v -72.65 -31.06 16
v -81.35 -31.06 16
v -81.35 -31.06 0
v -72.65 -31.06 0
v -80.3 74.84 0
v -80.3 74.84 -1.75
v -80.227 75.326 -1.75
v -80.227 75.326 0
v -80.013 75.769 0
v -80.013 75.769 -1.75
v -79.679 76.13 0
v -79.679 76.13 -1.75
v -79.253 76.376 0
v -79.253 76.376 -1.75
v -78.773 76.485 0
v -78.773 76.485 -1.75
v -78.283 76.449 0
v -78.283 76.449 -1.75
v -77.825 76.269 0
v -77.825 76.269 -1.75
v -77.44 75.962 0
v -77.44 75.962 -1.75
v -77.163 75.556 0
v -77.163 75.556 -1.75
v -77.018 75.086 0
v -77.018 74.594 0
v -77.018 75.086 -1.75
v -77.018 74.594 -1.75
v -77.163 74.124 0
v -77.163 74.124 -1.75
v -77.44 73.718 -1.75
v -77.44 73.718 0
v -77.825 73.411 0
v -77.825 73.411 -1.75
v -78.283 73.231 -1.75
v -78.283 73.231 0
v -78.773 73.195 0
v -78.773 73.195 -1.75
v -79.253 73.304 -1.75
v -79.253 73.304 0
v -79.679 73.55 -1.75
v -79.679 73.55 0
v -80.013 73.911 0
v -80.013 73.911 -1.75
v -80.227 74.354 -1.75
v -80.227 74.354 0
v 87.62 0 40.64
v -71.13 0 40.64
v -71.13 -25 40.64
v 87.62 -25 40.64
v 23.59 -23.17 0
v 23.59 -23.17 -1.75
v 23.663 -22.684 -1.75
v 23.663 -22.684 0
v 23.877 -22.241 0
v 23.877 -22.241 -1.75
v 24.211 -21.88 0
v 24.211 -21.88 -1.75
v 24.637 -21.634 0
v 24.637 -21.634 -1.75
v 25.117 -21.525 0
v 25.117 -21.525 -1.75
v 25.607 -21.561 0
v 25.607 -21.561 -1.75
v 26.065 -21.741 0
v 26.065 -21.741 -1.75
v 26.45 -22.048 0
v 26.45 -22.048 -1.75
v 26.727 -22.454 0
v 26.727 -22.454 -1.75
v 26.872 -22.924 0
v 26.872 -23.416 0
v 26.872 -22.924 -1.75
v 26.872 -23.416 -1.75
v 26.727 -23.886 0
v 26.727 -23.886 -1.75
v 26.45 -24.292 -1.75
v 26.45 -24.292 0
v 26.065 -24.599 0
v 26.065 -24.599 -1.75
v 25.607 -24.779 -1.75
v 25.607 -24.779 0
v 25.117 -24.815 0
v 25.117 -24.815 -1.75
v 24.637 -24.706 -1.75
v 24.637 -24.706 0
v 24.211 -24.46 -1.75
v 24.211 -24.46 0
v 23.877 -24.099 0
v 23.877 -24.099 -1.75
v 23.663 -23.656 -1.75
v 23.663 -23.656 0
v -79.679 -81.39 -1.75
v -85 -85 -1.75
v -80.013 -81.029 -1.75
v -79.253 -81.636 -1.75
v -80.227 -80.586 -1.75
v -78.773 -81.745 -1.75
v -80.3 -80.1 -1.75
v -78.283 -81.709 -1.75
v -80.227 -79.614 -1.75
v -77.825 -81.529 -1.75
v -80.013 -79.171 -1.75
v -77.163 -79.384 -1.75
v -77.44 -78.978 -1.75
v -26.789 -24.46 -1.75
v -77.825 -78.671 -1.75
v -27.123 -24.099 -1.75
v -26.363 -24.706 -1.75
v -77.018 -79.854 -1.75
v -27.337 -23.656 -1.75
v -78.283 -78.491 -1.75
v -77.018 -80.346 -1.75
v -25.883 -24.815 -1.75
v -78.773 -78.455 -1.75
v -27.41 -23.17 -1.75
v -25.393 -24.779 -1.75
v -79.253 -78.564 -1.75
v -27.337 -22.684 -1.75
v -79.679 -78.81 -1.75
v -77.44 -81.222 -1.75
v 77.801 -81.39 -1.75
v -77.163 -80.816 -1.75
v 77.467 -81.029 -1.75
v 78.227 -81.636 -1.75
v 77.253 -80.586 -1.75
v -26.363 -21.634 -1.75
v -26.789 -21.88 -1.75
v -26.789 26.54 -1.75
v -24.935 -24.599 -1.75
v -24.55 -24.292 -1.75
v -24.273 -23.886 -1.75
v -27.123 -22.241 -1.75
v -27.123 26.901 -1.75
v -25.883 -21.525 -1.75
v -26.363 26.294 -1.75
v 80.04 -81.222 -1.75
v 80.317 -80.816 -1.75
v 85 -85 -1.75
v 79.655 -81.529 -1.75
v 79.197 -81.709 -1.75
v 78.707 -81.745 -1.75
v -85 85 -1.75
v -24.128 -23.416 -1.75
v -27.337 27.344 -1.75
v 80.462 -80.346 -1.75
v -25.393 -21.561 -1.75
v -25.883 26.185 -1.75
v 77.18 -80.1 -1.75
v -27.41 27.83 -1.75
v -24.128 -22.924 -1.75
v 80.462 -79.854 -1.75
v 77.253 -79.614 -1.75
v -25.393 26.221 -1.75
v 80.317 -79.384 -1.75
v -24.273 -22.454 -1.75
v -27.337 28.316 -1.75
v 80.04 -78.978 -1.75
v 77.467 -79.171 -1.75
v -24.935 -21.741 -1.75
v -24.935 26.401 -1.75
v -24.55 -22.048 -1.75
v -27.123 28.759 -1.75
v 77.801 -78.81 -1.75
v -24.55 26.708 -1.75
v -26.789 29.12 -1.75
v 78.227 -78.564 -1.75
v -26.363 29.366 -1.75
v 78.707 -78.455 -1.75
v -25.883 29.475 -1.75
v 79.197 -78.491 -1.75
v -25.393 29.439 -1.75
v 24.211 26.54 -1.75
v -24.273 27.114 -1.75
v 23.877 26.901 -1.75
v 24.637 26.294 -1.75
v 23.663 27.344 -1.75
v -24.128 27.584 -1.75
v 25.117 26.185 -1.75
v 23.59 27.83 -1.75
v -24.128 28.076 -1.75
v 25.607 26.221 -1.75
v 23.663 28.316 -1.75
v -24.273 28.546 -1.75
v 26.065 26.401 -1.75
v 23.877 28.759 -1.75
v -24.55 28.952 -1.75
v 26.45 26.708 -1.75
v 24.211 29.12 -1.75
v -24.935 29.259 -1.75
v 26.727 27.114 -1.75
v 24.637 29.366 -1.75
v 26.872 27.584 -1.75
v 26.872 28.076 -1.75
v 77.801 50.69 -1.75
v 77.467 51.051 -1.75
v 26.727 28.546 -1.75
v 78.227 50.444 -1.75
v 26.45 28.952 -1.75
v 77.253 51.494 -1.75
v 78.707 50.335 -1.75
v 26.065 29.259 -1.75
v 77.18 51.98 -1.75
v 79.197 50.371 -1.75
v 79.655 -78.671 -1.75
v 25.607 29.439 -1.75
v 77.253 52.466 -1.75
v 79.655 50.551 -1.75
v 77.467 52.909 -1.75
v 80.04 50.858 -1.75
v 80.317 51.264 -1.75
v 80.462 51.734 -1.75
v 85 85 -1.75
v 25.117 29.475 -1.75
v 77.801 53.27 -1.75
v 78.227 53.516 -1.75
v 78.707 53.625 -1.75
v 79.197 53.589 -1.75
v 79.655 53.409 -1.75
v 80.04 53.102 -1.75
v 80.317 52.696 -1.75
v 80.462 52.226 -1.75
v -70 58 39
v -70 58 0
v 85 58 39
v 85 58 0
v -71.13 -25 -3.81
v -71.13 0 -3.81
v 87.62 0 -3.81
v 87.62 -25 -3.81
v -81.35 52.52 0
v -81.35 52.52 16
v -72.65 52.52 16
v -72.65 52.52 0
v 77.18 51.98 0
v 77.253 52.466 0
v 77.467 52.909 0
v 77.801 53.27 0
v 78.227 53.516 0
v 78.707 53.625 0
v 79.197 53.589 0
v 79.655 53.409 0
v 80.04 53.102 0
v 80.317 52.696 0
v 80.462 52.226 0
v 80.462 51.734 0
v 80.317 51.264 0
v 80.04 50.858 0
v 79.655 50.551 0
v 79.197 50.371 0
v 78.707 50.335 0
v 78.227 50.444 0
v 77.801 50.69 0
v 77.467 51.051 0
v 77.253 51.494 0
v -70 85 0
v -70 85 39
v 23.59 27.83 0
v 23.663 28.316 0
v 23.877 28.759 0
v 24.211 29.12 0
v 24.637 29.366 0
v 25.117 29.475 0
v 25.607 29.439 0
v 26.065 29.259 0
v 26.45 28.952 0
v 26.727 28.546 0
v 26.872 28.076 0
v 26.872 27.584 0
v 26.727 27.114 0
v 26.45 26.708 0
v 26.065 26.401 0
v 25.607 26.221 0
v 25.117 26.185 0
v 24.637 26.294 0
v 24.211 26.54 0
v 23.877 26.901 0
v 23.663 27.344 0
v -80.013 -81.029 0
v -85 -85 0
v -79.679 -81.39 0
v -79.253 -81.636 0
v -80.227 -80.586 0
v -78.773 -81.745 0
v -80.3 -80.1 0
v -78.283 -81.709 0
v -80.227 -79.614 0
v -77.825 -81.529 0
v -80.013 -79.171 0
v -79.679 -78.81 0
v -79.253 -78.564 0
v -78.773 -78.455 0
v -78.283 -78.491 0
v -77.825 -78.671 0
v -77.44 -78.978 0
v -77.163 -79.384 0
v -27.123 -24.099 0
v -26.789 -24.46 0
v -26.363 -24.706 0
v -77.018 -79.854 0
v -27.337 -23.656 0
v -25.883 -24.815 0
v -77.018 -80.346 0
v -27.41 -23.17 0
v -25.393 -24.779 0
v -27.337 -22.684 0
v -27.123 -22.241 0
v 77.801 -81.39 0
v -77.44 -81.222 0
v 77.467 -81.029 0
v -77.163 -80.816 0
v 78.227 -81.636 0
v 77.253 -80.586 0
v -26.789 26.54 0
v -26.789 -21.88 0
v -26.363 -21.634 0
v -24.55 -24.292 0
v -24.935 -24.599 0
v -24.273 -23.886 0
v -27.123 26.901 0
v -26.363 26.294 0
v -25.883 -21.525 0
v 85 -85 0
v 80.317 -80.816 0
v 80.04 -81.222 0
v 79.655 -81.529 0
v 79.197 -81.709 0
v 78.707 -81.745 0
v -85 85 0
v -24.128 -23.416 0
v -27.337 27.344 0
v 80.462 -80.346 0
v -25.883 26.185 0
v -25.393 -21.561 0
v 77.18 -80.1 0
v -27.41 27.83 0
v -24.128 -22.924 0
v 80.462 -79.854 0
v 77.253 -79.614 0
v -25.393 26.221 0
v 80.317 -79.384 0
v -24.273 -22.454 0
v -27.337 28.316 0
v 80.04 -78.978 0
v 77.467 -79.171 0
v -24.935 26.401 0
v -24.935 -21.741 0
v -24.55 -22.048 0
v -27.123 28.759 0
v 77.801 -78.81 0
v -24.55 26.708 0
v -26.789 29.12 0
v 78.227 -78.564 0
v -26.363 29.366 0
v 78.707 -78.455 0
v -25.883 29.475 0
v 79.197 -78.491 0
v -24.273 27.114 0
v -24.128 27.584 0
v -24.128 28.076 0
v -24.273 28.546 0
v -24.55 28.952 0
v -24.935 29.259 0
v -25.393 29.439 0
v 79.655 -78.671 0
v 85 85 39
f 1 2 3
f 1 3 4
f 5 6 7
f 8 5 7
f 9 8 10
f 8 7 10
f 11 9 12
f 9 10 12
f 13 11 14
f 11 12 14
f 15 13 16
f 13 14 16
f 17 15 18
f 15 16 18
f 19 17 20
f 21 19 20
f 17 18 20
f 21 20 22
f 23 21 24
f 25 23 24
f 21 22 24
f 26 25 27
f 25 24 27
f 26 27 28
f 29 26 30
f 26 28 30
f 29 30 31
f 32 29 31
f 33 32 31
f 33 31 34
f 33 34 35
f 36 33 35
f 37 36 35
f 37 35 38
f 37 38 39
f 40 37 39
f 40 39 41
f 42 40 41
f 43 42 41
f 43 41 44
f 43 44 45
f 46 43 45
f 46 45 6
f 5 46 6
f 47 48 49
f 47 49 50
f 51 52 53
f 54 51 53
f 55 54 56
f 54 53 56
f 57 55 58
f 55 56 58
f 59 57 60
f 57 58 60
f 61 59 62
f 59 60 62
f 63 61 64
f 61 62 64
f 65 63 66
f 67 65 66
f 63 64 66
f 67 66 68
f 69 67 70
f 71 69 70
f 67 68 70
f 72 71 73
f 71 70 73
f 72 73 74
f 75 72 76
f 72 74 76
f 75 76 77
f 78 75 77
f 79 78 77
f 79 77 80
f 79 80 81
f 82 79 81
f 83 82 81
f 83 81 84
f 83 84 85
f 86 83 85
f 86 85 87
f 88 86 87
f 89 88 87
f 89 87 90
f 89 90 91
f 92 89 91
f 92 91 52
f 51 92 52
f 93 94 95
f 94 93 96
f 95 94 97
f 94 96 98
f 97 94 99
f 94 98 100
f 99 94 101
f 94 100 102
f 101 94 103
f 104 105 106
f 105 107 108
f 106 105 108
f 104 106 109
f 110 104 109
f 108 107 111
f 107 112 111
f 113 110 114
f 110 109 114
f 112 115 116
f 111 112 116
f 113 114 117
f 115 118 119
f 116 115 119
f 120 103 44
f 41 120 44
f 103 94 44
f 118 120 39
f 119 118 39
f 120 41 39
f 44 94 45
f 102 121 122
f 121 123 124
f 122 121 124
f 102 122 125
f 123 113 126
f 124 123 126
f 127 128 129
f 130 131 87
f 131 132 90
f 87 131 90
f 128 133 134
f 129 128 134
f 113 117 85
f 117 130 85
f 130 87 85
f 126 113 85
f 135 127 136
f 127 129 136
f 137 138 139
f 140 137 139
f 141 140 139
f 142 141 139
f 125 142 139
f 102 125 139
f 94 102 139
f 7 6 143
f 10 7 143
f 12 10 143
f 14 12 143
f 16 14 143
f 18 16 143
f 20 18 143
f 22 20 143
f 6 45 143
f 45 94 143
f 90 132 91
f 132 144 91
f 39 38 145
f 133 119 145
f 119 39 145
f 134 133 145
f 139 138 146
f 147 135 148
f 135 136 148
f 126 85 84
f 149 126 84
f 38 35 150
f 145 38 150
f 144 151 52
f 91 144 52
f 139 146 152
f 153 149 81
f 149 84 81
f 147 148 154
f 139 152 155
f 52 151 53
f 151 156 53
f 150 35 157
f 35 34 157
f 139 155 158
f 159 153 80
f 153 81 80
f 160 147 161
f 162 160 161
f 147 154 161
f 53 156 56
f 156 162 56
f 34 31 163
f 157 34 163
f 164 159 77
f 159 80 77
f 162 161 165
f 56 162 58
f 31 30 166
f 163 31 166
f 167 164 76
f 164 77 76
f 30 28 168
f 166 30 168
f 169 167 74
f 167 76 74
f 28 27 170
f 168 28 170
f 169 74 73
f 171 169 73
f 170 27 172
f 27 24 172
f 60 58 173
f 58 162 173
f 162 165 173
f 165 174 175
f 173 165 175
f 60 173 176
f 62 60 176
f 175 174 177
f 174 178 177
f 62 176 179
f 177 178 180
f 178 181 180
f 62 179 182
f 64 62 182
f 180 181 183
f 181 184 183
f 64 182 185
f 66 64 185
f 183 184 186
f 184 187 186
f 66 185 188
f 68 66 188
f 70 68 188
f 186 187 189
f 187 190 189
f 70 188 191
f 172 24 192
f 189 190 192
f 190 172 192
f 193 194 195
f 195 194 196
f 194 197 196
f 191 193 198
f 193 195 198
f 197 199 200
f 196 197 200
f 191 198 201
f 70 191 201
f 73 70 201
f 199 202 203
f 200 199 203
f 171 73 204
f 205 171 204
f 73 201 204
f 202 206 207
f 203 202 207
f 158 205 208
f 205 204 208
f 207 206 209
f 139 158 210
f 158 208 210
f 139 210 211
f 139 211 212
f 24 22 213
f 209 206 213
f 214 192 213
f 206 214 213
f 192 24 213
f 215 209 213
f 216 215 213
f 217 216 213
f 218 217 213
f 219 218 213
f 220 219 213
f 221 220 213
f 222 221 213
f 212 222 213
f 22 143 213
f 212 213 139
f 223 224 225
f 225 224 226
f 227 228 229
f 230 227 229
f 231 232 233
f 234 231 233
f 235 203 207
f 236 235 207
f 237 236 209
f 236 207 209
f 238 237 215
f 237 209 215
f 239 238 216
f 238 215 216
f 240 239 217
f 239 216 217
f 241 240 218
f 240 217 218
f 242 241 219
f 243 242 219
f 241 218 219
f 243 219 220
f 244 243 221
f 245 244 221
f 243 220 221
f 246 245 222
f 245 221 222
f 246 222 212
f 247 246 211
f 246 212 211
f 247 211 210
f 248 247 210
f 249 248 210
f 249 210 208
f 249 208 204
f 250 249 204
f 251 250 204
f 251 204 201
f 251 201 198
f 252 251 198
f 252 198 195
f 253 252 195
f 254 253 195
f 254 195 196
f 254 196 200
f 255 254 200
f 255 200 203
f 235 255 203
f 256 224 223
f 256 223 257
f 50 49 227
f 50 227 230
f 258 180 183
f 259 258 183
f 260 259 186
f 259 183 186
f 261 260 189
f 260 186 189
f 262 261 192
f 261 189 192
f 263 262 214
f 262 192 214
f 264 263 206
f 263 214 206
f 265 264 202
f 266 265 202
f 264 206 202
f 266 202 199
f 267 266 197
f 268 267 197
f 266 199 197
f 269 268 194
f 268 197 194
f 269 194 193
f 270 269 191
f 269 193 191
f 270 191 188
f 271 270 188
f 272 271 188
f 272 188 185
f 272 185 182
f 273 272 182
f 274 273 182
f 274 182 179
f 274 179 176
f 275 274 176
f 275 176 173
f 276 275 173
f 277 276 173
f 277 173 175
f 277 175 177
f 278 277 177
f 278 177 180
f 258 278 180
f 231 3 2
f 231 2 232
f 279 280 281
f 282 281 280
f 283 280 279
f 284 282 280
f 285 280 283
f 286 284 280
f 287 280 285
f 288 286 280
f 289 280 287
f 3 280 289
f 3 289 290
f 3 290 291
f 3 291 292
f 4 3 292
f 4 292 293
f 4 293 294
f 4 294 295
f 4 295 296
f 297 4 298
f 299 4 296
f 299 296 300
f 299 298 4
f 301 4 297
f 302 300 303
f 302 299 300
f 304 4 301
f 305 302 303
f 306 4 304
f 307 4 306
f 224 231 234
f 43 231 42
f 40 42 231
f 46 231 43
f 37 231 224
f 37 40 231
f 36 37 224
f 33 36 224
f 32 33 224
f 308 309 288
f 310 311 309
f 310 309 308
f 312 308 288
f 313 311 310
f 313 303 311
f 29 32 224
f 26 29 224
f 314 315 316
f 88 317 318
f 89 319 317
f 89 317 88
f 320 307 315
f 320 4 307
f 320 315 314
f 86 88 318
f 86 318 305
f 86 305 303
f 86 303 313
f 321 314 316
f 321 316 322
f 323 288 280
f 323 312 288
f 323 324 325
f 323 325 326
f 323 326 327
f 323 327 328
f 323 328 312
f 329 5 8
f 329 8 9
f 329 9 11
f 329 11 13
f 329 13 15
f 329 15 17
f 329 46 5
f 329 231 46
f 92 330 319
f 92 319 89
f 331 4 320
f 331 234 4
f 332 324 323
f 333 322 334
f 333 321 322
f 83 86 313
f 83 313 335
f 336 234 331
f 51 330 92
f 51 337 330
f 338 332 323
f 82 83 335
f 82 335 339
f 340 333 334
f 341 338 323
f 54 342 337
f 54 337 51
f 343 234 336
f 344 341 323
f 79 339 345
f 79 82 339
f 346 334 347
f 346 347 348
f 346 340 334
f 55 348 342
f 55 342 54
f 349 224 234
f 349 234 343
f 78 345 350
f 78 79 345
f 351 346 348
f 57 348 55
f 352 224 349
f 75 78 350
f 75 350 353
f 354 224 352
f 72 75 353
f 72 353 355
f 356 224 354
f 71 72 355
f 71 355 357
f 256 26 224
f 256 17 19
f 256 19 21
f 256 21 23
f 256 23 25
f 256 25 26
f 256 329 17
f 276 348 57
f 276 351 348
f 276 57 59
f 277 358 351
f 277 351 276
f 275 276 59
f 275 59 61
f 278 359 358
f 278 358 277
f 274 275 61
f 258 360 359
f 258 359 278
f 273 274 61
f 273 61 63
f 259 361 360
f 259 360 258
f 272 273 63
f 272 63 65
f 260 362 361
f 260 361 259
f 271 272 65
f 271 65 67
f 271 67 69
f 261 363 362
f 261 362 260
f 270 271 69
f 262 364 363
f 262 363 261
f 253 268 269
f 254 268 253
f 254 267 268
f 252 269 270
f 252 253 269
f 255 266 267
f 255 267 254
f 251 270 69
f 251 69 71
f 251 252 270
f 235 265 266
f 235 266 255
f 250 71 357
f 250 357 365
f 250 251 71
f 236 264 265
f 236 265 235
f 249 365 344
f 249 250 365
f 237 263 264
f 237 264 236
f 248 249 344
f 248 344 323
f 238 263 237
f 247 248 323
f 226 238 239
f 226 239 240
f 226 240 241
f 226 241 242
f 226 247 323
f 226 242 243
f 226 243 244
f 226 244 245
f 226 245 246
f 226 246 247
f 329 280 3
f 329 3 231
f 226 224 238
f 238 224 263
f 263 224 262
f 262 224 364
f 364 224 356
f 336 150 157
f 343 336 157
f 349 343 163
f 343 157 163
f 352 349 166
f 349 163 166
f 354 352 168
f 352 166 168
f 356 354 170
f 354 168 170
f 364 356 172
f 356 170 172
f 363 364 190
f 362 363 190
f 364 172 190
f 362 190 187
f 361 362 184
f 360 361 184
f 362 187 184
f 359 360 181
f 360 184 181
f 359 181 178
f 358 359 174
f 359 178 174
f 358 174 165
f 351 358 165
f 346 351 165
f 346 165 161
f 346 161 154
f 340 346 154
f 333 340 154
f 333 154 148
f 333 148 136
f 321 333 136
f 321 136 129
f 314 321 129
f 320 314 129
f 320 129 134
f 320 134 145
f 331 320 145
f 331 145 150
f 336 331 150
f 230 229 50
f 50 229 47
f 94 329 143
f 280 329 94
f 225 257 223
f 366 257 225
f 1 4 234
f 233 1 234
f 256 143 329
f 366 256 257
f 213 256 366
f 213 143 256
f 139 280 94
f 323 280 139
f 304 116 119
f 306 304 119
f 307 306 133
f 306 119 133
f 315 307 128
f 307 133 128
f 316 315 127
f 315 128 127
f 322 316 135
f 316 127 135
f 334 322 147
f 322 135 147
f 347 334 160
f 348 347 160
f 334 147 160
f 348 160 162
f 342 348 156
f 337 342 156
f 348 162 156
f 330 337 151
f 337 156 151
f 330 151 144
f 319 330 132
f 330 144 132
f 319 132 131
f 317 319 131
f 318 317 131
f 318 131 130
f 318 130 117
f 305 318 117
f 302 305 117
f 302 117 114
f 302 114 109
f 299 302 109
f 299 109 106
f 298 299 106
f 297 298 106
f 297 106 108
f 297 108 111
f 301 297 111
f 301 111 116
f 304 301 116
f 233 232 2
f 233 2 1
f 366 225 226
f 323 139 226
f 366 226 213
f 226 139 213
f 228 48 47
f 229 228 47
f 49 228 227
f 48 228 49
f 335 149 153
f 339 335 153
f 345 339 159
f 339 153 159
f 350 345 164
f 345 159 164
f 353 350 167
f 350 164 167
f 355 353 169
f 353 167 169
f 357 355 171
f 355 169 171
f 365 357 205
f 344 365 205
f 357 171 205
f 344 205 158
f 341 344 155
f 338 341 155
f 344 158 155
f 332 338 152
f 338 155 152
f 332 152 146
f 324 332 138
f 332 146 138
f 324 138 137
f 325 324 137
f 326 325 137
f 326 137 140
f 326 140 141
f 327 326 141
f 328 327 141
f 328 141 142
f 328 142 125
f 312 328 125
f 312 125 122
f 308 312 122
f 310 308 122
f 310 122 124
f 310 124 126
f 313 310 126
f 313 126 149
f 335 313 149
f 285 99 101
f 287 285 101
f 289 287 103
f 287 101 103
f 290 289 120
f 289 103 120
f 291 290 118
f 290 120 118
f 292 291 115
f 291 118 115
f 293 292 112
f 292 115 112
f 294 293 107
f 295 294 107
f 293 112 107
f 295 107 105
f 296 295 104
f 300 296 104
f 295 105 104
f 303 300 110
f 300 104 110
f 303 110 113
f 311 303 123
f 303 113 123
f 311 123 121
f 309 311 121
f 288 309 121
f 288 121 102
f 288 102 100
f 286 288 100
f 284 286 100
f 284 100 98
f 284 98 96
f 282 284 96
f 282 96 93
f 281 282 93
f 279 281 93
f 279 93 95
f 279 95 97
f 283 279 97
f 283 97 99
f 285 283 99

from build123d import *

# Parameters (mm, degrees)
F0_W       = 155
F0_H       = 27
F0_H_2     = 113
F0_H_3     = 30
F1_DEPTH   = 1.75
F2_W       = 8.7
F2_H       = 83.58
F3_DEPTH   = 16
F5_DEPTH   = 39
F6_D       = 3.3
F6_ON_F2_D = 3.3
F4_W       = 158.75
F4_H       = 44.45
F7_DEPTH   = 25


with BuildPart() as f1:
    # F0 (on Top) → F1 (new body)
    with BuildSketch(Plane.XY):
        with Locations((7.5, 71.5)):
            Rectangle(F0_W, F0_H)
        with Locations((7.5, 1.5)):
            Rectangle(F0_W, F0_H_2)
        Polygon((-85, 85), (-85, -85), (-70, -85), (-70, -55), (-70, 58), (-70, 85), align=None)
        with Locations((7.5, -70)):
            Rectangle(F0_W, F0_H_3)
    extrude(amount=-F1_DEPTH)

    # F2 (on face) → F3 (join)
    with BuildSketch(Plane.XY):
        with Locations((-76.9997725161, 10.73)):
            Rectangle(F2_W, F2_H)
    extrude(amount=F3_DEPTH)

    # F0 (on Top) → F5 (join)
    with BuildSketch(Plane.XY):
        with Locations((7.5, 71.5)):
            Rectangle(F0_W, F0_H)
    extrude(amount=F5_DEPTH)

    # F6 (through all)
    with Locations(Plane.XY):
        with Locations((-78.65, -80.1), (-78.65, 74.84), (78.83, -80.1), (78.83, 51.98)):
            Hole(F6_D / 2)

    # F6 on F2 (through all)
    with Locations(Plane.XY):
        with Locations((-25.76, -23.17), (25.24, -23.17), (25.24, 27.83), (-25.76, 27.83)):
            Hole(F6_ON_F2_D / 2)


with BuildPart() as f7:
    # F4 (on Front) → F7 (new body)
    with BuildSketch(Plane.XZ):
        with Locations((8.245, 18.415)):
            Rectangle(F4_W, F4_H)
    extrude(amount=F7_DEPTH)


solid = Compound([f1.part, f7.part])
